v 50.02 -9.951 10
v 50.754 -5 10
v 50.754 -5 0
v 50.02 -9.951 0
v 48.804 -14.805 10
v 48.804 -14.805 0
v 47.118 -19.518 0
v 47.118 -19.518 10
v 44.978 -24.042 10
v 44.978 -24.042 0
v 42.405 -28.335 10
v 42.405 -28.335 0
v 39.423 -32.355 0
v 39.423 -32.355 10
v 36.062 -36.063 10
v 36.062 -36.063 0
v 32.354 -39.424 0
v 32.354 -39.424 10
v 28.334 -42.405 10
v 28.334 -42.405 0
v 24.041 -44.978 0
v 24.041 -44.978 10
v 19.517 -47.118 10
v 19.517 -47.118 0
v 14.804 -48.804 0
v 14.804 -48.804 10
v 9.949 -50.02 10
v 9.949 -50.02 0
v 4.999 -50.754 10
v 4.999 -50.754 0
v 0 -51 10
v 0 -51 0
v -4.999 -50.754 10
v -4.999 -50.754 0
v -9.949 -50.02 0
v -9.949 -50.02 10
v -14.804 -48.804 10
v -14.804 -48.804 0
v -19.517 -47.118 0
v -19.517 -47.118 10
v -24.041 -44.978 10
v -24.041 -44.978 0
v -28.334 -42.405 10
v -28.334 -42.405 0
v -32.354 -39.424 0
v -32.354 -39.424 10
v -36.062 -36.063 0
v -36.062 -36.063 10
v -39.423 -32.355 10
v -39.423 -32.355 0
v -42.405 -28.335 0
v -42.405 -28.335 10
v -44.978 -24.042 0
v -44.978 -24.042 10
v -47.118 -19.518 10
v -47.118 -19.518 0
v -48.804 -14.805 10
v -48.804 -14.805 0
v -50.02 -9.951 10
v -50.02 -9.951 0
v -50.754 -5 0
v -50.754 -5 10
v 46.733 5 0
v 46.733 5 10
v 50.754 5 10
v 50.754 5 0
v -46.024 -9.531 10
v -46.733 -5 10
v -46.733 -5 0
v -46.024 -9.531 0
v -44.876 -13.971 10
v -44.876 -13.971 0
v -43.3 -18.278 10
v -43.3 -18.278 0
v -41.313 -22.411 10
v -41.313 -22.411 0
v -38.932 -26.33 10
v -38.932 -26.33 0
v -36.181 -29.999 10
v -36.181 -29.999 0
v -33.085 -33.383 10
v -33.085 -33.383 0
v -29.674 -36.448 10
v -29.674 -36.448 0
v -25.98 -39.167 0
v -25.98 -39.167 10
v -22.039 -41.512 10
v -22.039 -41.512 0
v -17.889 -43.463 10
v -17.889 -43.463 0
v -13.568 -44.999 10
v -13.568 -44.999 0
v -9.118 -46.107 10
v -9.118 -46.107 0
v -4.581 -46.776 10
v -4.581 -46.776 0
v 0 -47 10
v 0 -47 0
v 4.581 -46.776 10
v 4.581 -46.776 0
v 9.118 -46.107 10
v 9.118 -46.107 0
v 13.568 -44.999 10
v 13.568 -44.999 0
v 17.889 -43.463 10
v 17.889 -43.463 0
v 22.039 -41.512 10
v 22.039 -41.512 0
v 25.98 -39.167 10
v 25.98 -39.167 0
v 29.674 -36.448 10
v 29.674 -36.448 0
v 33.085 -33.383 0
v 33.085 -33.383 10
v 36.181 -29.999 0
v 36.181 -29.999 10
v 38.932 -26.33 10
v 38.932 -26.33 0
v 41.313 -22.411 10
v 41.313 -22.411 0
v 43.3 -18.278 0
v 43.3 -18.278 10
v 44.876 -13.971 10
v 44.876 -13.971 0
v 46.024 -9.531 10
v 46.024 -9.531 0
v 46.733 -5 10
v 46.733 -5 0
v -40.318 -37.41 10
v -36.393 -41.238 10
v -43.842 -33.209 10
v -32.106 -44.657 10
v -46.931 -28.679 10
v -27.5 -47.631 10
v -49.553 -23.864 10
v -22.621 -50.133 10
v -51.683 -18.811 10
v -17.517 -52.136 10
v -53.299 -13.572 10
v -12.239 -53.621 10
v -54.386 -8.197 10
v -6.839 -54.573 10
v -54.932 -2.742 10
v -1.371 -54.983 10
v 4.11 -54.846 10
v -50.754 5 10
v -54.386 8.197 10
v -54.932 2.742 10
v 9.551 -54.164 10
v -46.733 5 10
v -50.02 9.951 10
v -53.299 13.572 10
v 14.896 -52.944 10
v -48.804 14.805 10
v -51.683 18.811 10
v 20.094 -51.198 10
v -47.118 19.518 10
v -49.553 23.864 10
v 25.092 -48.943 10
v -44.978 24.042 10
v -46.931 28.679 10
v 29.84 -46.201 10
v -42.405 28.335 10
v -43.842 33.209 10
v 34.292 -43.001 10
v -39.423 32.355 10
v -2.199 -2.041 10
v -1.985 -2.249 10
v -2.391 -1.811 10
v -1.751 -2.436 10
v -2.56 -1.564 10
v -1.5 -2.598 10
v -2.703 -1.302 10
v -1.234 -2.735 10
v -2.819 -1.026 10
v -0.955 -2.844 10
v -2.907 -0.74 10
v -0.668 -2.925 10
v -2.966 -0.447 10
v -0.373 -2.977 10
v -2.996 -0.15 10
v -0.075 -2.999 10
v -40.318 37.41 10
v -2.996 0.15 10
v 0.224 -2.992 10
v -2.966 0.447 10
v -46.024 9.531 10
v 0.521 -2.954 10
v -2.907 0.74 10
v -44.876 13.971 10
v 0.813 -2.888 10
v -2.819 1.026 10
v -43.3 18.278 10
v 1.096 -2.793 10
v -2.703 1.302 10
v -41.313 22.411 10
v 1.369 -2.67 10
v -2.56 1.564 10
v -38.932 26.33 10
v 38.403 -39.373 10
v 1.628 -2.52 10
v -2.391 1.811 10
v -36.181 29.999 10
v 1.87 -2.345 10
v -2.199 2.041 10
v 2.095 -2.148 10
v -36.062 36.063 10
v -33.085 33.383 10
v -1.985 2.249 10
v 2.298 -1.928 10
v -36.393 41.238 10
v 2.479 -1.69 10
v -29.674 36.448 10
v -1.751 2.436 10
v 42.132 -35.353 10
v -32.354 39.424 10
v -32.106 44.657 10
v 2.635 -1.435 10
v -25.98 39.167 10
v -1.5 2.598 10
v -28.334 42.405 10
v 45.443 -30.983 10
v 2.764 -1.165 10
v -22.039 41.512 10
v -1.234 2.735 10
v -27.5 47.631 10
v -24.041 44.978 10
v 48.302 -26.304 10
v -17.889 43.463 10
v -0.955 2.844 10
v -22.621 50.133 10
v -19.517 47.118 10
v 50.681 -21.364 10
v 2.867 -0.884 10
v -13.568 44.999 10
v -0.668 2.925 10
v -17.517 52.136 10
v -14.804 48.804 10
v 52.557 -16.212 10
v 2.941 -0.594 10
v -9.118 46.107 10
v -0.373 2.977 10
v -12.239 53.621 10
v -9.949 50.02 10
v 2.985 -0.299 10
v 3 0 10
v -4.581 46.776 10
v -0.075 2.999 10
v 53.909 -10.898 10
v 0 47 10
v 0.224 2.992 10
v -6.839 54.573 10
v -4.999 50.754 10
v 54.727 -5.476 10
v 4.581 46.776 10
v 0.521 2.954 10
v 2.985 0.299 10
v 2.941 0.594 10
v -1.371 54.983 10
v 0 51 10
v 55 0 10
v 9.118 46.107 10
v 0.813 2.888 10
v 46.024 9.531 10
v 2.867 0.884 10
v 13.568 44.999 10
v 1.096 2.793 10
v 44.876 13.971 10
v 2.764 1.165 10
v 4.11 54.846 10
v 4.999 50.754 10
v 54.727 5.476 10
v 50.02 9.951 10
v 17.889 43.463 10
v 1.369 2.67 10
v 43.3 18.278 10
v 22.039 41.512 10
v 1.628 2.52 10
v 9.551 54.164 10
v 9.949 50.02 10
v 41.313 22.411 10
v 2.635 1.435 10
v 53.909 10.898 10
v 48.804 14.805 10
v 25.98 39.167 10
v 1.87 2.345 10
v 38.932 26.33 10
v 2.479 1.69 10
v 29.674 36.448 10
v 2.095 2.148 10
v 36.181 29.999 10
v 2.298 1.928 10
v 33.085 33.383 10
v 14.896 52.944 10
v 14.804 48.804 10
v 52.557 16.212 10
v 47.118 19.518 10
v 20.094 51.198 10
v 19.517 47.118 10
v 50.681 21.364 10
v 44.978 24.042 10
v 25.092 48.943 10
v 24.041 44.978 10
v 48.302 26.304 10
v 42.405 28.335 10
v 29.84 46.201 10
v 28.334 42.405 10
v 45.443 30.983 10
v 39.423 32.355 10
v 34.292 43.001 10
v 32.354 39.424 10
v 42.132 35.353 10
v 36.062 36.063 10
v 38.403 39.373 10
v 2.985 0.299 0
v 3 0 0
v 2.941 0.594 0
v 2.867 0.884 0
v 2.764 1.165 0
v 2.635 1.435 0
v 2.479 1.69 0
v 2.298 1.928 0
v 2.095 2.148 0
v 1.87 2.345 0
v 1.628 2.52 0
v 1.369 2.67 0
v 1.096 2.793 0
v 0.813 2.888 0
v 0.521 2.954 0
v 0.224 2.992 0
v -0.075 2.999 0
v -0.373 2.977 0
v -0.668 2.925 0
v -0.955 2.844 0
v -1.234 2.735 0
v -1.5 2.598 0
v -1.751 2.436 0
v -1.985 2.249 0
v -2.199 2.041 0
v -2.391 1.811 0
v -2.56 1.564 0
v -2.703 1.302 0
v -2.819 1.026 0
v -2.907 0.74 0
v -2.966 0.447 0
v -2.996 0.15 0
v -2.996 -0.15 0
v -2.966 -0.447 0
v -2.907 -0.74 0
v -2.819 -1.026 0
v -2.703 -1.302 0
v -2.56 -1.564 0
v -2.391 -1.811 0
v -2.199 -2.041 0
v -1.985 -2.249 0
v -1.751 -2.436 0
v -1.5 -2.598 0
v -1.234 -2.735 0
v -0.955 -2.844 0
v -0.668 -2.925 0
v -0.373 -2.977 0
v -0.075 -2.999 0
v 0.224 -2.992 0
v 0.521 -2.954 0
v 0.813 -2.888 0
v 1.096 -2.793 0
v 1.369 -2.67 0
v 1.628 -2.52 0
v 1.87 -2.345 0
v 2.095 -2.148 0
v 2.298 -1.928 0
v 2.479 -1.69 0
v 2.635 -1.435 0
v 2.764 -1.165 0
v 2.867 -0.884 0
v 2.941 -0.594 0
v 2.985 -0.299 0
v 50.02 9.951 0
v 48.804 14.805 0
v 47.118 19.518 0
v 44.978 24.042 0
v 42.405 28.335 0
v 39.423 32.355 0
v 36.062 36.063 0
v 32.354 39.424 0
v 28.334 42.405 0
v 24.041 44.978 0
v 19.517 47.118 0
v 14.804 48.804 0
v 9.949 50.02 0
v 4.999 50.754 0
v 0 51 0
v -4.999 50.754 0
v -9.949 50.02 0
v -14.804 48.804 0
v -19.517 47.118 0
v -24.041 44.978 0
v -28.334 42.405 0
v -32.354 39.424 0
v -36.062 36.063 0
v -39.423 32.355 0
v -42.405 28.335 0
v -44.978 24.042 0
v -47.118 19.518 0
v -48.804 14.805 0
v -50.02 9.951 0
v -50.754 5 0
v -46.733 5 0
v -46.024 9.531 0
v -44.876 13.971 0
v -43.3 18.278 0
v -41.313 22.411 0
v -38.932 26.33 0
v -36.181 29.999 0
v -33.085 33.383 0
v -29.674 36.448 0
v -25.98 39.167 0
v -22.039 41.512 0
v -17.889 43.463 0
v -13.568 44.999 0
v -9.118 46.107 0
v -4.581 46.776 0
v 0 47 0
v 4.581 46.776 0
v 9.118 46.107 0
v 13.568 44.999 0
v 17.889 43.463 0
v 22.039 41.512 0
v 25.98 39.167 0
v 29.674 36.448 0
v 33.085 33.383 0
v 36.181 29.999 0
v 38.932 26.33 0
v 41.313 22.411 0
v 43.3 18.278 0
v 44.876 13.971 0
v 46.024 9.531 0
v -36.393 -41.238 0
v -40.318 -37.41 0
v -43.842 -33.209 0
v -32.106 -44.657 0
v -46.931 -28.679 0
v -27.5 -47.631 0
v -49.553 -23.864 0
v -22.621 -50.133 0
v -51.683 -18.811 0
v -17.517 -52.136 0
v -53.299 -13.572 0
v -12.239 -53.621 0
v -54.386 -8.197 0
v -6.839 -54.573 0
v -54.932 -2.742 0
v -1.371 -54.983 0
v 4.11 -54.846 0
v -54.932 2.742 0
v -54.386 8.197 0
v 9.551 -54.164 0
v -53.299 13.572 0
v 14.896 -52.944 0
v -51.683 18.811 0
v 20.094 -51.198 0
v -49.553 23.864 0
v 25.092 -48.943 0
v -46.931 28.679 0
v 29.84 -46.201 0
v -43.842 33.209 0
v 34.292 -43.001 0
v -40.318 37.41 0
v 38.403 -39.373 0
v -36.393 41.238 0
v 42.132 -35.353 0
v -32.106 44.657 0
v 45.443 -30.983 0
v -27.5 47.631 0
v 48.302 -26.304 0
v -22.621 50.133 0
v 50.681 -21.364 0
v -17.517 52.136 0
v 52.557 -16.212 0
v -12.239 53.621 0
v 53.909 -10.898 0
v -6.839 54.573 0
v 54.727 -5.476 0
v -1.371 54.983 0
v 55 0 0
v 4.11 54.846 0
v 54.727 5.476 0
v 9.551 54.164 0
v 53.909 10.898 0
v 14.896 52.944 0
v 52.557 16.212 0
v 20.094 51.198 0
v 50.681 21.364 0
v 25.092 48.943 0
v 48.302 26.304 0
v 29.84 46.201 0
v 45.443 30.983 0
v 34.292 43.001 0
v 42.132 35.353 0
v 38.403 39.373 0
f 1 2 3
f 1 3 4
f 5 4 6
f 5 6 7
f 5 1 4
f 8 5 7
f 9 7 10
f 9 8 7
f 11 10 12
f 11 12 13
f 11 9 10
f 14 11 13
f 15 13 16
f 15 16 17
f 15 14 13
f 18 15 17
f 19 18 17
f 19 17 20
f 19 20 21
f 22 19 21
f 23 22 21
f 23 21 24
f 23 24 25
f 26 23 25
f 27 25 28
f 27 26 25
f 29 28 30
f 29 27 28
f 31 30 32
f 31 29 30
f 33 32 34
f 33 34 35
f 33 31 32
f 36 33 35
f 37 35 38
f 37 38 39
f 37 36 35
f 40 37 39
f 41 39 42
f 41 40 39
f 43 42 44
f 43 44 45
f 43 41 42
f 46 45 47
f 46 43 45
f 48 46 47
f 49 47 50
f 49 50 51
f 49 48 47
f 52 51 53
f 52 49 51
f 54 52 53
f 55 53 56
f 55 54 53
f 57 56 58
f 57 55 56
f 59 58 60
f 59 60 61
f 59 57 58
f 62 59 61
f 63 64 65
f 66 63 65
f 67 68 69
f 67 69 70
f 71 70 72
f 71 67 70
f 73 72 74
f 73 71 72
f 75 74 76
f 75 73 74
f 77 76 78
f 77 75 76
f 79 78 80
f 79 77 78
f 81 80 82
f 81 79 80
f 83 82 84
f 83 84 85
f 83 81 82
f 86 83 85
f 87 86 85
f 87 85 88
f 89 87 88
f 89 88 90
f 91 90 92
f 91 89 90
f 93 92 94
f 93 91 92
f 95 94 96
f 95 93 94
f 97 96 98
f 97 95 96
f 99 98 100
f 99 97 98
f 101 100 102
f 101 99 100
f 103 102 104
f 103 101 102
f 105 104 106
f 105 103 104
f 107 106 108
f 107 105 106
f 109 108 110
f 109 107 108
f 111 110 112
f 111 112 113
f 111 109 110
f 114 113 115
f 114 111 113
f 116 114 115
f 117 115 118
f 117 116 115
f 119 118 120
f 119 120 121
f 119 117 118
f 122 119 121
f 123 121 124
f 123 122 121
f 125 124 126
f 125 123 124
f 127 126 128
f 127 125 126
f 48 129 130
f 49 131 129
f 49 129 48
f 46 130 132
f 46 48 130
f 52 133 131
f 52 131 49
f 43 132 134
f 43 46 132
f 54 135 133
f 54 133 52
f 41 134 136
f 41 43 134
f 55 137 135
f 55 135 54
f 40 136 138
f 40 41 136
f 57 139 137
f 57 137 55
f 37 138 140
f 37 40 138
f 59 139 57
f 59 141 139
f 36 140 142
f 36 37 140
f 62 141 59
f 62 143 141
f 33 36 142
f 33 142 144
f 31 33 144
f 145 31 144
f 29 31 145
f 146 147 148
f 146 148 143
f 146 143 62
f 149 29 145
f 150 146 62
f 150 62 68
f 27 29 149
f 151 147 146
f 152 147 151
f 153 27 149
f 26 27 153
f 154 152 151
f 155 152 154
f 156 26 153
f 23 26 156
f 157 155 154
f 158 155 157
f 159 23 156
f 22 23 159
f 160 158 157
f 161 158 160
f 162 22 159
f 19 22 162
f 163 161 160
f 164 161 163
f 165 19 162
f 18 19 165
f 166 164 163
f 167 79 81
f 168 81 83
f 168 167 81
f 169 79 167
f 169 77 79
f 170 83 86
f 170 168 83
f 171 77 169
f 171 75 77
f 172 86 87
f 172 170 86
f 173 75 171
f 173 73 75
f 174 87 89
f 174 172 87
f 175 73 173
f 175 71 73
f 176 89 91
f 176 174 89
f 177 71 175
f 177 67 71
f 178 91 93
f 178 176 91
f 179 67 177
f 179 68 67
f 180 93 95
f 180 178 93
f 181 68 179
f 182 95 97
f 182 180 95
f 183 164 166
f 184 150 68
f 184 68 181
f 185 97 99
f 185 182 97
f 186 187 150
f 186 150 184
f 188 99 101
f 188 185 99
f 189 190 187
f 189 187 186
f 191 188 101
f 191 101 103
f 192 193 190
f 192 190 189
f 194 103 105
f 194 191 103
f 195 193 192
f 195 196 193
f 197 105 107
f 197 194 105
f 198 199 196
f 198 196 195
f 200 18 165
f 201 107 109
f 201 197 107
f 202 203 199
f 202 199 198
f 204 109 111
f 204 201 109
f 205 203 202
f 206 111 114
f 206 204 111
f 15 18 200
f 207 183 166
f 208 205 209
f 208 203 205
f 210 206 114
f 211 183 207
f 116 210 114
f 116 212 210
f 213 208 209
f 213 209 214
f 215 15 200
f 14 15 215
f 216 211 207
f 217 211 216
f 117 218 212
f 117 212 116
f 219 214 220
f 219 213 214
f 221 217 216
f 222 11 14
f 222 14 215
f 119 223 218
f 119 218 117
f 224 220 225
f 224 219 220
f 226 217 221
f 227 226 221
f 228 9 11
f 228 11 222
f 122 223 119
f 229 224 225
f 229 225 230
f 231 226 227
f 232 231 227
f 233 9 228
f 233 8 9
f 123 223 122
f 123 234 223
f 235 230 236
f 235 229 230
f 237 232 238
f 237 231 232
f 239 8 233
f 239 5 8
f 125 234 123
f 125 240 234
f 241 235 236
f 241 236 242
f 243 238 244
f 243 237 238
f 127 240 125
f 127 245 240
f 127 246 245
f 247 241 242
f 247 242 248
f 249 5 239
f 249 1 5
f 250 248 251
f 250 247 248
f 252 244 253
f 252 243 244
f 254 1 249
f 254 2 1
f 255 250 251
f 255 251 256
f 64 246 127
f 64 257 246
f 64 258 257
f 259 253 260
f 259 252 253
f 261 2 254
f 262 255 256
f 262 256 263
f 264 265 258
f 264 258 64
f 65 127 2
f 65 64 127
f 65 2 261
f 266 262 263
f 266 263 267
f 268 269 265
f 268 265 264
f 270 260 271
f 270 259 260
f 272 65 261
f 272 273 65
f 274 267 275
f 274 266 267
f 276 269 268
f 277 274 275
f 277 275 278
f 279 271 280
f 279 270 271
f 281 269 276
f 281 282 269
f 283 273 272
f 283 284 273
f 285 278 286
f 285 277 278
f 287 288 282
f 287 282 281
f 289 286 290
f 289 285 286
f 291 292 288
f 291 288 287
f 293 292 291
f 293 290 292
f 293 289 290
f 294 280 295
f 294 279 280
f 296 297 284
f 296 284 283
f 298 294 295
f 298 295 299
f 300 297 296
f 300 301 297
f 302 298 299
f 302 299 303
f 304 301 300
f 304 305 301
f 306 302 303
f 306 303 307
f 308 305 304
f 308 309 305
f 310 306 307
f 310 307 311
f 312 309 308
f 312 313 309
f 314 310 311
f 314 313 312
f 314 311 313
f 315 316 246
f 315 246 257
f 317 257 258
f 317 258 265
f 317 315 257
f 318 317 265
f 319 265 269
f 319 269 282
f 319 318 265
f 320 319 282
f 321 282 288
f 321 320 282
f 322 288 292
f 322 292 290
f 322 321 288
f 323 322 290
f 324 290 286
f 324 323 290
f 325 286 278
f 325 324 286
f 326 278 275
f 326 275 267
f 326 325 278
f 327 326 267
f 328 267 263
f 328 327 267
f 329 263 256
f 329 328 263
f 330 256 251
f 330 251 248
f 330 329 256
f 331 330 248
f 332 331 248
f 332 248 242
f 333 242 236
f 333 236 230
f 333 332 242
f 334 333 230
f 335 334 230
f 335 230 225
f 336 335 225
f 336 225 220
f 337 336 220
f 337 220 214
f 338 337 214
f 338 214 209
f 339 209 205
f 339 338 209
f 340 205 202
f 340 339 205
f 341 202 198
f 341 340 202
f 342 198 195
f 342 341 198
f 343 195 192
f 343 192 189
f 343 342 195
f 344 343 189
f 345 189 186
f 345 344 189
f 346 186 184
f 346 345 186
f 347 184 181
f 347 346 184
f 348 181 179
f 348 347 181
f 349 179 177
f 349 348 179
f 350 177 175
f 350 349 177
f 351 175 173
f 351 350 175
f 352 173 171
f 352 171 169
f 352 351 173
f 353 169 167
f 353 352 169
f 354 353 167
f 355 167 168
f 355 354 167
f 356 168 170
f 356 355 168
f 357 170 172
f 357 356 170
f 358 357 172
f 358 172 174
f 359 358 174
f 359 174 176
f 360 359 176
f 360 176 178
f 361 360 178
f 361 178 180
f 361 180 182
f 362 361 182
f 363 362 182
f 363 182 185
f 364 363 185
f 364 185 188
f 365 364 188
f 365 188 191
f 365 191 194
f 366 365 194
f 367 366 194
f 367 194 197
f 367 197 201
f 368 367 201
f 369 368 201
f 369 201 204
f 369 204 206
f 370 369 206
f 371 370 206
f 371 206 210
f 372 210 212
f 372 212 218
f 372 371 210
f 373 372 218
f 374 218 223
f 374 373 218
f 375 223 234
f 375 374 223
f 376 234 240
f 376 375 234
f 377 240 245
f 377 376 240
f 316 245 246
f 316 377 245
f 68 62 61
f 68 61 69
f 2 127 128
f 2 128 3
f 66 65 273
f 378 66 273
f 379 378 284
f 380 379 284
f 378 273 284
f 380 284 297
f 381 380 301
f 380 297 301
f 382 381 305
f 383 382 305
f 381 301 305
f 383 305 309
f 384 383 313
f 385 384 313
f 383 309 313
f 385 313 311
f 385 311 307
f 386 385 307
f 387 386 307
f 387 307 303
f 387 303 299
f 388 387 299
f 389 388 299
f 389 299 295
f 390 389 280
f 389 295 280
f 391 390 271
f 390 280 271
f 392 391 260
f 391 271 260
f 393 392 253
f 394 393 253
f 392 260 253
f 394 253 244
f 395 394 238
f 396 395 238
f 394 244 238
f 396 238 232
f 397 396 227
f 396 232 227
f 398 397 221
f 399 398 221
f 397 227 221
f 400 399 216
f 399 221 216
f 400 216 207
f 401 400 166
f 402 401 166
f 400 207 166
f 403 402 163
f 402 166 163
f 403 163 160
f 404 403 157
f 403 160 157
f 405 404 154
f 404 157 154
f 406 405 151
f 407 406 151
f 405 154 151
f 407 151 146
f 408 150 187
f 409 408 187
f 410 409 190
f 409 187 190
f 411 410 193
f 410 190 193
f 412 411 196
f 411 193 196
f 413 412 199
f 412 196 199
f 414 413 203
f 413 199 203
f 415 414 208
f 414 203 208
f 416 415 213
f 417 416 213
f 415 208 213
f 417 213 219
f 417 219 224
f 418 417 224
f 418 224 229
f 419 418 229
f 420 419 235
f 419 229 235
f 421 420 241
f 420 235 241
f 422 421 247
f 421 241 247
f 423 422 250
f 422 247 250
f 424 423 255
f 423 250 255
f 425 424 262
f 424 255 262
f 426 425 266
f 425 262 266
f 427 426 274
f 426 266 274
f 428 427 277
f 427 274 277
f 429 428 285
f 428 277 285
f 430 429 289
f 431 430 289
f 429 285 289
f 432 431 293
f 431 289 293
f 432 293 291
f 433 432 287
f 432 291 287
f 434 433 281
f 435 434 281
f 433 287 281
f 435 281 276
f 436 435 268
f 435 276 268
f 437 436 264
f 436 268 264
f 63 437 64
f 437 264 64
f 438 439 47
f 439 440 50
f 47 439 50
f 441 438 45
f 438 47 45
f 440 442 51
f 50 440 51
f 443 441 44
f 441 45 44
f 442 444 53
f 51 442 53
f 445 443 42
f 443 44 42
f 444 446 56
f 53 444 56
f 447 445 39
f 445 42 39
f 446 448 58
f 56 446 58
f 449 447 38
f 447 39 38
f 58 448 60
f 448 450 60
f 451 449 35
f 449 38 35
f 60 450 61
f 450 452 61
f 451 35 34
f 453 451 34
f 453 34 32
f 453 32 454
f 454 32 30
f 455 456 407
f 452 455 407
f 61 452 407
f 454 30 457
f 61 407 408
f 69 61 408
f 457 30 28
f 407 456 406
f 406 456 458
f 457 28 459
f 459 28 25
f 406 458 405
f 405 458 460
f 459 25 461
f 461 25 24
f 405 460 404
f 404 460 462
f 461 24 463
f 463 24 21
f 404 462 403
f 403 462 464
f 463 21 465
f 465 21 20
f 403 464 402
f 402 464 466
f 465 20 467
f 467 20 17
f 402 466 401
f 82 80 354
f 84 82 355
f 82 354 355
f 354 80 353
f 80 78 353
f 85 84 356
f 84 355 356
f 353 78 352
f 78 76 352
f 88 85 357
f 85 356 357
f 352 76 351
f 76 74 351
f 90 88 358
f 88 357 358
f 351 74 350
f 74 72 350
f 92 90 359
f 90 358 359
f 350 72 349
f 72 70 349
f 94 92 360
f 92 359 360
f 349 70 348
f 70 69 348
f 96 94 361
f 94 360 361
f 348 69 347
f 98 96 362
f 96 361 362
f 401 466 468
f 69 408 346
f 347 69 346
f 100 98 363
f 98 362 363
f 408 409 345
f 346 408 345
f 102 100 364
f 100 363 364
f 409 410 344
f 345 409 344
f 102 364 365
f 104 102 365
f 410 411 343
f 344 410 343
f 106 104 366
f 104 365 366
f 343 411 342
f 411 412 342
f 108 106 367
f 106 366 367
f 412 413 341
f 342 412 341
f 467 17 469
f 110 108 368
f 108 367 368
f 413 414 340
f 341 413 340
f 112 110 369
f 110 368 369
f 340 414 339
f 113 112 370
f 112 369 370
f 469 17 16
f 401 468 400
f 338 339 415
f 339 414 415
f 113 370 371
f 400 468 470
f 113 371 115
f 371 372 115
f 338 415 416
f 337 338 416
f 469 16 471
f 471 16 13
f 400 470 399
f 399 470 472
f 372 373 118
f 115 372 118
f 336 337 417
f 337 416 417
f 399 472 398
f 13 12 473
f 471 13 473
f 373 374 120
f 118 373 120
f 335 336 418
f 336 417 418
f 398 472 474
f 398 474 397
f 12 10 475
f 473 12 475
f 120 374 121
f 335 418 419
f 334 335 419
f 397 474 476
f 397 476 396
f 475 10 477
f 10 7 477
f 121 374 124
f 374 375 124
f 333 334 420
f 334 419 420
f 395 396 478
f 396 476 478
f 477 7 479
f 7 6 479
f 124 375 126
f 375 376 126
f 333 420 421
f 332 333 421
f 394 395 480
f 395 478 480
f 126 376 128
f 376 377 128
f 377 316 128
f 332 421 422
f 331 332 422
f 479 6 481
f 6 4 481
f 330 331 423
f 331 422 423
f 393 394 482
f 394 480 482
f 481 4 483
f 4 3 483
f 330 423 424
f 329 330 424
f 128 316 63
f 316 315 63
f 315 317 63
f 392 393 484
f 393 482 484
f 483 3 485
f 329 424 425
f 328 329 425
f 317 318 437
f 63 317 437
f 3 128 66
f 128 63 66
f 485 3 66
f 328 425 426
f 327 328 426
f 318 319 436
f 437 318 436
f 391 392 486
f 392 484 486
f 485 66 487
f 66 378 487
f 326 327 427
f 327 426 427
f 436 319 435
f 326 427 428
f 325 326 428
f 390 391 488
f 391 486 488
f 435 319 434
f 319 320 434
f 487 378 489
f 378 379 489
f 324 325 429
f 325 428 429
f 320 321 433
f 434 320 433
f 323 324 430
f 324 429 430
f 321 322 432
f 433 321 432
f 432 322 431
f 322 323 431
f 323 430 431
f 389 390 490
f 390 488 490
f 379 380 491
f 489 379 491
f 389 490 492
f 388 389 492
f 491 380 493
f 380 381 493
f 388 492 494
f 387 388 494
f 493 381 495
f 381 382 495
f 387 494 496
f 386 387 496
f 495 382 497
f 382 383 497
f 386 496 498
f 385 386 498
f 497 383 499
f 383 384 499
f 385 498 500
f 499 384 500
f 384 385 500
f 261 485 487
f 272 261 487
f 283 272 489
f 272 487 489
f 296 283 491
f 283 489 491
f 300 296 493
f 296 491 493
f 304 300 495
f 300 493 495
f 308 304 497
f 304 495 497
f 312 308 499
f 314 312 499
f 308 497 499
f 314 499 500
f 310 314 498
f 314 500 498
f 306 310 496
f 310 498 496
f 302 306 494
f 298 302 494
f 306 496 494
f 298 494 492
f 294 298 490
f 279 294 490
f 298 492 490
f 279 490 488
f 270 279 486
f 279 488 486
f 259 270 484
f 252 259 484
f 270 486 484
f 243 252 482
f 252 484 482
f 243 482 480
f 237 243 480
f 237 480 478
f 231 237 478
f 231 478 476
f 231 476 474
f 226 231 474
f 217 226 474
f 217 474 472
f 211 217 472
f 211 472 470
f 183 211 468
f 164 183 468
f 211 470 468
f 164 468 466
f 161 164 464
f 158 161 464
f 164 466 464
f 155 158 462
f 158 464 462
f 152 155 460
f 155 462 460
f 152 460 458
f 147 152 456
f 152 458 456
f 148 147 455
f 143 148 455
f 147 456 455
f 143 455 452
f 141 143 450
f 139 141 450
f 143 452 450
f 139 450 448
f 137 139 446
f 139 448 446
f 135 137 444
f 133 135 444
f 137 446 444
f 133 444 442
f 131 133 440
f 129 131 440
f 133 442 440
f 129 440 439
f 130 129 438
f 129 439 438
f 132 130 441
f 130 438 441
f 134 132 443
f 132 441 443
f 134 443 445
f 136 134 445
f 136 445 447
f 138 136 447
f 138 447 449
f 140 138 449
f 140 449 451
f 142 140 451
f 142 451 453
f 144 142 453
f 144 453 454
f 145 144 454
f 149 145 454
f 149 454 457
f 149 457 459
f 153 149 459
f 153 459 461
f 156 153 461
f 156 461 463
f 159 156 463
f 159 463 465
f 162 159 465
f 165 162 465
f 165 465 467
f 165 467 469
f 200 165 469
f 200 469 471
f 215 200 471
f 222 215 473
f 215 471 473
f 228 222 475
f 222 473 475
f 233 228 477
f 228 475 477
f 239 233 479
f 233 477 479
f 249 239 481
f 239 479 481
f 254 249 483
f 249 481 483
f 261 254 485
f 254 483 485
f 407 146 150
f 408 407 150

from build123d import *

# Parameters (mm, degrees)
SKETCH1_R           = 55
SKETCH1_R_2         = 3
BOSS_EXTRUDE1_DEPTH = 10
CUT_EXTRUDE1_DEPTH  = 10


with BuildPart() as part:
    # Sketch1 → Boss-Extrude1 (new body)
    with BuildSketch(Plane.XY):
        Circle(SKETCH1_R)
        Circle(SKETCH1_R_2, mode=Mode.SUBTRACT)
    extrude(amount=BOSS_EXTRUDE1_DEPTH)

    # Sketch2 → Cut-Extrude1 (cut)
    with BuildSketch(Plane.XY.offset(10)):
        with BuildLine():
            Line((-50.754310162, -5), (-46.733285782, -5))
            ThreePointArc((-46.733285782, -5), (0, -47), (46.733285782, -5))
            Line((46.733285782, -5), (50.754310162, -5))
            ThreePointArc((50.754310162, -5), (0, -51), (-50.754310162, -5))
        make_face()
        with BuildLine():
            Line((-50.754310162, 5), (-46.733285782, 5))
            ThreePointArc((-46.733285782, 5), (0, 47), (46.733285782, 5))
            Line((46.733285782, 5), (50.754310162, 5))
            ThreePointArc((50.754310162, 5), (0, 51), (-50.754310162, 5))
        make_face()
    extrude(amount=-CUT_EXTRUDE1_DEPTH, mode=Mode.SUBTRACT)


solid = part.part
